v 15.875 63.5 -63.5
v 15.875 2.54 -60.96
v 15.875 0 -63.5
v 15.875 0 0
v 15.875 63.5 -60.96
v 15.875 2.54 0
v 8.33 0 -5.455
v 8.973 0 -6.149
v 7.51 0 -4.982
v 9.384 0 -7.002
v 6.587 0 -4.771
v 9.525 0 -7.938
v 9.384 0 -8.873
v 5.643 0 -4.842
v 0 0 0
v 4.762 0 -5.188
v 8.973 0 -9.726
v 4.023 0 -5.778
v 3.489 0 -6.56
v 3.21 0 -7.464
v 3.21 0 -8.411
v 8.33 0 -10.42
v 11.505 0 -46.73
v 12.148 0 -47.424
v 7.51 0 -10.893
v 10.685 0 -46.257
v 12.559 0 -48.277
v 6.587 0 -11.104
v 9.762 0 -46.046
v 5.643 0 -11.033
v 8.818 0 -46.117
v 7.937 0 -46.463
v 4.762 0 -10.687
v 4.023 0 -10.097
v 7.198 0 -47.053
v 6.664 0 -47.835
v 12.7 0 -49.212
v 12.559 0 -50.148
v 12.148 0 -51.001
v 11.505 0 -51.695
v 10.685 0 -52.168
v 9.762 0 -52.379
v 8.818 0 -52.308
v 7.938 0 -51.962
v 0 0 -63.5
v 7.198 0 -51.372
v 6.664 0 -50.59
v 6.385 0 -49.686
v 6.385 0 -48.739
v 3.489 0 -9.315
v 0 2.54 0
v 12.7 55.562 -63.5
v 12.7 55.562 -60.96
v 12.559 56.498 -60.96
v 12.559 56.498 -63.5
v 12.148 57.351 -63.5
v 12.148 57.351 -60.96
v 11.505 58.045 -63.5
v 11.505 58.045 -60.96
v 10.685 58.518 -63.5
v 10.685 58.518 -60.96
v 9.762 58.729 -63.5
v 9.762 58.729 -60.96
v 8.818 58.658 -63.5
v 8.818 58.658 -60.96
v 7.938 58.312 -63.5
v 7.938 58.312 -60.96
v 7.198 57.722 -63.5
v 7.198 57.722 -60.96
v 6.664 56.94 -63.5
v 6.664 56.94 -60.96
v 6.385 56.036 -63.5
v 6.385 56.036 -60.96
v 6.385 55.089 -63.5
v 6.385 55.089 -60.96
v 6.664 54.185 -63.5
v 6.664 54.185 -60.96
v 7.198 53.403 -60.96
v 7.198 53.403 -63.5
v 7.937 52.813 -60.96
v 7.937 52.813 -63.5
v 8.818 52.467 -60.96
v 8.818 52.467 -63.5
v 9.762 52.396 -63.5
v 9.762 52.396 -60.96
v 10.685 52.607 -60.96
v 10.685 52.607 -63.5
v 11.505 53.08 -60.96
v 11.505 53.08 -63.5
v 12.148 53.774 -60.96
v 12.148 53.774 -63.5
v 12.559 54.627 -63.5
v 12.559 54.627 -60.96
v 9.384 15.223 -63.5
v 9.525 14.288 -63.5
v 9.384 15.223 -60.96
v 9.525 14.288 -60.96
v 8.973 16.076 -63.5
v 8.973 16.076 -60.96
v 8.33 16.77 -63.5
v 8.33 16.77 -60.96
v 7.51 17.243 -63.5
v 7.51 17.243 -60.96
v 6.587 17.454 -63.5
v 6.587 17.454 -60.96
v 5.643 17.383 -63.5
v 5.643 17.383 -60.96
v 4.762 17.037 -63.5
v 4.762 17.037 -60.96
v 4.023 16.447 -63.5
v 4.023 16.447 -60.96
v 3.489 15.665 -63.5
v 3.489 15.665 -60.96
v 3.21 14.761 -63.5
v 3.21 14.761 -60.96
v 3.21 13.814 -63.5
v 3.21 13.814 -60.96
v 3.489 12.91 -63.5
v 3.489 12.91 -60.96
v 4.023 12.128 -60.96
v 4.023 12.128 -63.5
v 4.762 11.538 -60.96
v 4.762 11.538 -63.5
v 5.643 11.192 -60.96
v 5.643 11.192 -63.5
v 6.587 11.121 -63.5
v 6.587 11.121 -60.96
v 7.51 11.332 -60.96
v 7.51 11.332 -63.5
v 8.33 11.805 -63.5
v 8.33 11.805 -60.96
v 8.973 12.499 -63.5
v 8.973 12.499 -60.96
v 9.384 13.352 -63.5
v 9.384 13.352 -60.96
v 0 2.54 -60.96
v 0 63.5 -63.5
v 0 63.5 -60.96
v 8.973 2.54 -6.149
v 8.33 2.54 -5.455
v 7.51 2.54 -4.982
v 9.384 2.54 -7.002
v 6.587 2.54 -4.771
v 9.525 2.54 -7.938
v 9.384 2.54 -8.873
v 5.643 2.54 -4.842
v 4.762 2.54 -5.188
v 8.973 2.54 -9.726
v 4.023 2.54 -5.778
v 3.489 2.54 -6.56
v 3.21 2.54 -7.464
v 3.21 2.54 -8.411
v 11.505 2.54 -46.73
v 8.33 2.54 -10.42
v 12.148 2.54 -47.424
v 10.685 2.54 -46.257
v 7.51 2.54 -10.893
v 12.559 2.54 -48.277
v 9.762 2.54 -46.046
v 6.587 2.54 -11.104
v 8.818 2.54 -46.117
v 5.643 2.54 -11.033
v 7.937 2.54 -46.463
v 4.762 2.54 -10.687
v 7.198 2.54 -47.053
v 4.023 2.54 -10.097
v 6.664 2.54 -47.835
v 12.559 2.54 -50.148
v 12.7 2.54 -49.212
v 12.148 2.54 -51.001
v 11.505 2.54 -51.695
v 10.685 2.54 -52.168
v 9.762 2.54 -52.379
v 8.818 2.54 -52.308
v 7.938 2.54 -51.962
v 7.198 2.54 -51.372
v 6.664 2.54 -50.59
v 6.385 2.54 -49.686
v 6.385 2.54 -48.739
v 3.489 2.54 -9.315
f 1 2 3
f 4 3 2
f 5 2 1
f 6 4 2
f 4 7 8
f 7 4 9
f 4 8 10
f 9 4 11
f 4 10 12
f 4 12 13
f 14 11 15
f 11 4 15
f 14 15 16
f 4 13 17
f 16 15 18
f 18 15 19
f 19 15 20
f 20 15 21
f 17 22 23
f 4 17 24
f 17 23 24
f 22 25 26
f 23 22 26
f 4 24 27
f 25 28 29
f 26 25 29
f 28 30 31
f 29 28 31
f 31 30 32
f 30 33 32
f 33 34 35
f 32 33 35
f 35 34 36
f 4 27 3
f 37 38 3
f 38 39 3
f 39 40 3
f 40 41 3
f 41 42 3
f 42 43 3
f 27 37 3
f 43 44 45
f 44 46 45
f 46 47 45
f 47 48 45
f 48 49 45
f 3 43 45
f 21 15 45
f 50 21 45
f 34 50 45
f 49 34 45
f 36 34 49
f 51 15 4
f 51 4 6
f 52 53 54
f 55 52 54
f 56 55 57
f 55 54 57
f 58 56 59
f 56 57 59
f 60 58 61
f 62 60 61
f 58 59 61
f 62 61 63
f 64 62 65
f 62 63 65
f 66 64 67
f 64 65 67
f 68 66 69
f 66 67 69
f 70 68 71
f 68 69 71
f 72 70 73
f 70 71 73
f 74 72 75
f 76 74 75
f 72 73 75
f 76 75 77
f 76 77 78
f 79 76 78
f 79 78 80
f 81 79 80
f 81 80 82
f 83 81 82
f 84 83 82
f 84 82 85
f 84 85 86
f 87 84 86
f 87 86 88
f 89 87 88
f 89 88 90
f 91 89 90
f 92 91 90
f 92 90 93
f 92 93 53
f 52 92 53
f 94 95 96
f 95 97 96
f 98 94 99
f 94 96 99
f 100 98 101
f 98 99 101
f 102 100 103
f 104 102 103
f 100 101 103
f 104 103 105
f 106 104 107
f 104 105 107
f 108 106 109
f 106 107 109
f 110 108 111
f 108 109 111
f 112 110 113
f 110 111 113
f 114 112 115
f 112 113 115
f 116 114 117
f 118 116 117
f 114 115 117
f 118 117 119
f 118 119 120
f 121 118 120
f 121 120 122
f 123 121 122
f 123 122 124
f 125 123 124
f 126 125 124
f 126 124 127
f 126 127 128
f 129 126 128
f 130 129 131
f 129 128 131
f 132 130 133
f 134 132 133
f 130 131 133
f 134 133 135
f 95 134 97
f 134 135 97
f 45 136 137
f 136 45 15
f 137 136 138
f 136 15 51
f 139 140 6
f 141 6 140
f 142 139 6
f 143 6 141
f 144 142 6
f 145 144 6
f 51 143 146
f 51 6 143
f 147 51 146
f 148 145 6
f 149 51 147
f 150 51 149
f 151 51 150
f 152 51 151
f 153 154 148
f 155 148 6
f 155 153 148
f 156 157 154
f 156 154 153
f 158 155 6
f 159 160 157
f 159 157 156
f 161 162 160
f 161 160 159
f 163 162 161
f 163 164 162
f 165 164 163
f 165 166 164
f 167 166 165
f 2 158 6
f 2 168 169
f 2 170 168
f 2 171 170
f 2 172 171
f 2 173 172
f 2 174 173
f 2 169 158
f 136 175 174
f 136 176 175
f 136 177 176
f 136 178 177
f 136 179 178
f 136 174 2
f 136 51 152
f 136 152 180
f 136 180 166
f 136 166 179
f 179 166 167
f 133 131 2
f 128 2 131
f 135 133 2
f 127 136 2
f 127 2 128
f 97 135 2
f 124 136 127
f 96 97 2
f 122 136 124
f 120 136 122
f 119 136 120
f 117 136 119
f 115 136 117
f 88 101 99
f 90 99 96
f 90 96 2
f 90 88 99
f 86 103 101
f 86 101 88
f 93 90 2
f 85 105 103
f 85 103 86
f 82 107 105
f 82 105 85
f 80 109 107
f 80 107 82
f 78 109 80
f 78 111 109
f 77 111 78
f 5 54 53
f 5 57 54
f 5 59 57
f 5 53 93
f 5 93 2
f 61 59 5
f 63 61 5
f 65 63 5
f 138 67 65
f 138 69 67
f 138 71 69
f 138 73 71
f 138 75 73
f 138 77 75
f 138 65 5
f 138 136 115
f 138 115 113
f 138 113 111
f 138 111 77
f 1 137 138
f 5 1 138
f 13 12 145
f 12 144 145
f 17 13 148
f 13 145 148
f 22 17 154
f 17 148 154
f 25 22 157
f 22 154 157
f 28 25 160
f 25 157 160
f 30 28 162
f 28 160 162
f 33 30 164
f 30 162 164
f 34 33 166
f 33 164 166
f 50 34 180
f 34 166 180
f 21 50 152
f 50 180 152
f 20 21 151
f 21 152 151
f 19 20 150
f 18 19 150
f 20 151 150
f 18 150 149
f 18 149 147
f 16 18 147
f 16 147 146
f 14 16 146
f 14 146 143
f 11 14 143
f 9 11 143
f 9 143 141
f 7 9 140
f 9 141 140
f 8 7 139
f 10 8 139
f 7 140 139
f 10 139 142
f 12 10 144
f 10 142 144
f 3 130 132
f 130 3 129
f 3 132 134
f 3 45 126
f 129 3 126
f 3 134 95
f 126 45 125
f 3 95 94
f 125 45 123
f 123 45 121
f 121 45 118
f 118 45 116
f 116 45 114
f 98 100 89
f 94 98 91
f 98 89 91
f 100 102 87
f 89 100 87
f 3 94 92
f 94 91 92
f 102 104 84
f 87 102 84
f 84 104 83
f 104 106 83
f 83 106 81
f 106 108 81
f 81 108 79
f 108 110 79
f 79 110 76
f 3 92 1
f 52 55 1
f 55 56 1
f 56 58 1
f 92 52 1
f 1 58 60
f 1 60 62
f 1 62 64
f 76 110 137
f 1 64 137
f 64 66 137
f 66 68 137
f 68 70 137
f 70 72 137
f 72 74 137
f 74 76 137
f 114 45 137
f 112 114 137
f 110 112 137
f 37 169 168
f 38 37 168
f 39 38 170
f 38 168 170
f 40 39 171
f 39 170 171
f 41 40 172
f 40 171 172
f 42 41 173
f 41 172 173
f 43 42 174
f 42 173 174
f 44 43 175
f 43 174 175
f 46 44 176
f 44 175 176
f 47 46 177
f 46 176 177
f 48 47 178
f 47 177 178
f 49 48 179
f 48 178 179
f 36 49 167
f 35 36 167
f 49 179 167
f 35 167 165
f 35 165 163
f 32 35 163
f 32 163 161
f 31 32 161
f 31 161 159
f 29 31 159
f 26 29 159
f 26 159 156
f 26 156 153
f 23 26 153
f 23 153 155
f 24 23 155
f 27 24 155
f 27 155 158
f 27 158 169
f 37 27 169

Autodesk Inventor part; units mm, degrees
ref_plane "YZ Plane" through (0, 0, 0) normal (1, 0, 0) x (0, 1, 0)
ref_plane "XZ Plane" through (0, 0, 0) normal (0, 1, 0) x (-1, 0, 0)
ref_plane "XY Plane" through (0, 0, 0) normal (0, 0, 1) x (1, 0, 0)
sketch "Sketch1" plane through (0, 0, 0) normal (1, 0, 0) x (0, 1, 0)
  line L0 (0, 0) -> (0, -63.5)
  line L1 (0, -63.5) -> (63.5, -63.5)
  line L2 (63.5, -63.5) -> (63.5, -60.96)
  line L3 (0, 0) -> (2.54, 0)
  line L4 (2.54, 0) -> (2.54, -60.96)
  line L5 (2.54, -60.96) -> (63.5, -60.96)
  dimension "d0" = 63.5
  dimension "d1" = 63.5
  dimension "d2" = 2.54
  dimension "d3" = 2.54
extrude "Extrusion1" add sketch "Sketch1" along normal blind 15.875
sketch "Sketch2" plane through (0, 2.54, 0) normal (0, 1, 0) x (1, 0, 0)
  circle A0 centre (6.35, 7.9375) radius 3.175
  circle A1 centre (9.525, 49.2125) radius 3.175
  point P0 (0, 0)
  dimension "d6" = 6.35
  dimension "d7" = 6.35
extrude "Extrusion2" cut sketch "Sketch2" against normal through all contours A1
extrude "Extrusion3" cut sketch "Sketch2" against normal through all contours A0
sketch "Sketch3" plane through (0, 2.54, -60.96) normal (0, 0, 1) x (1, 0, 0)
  line L0 (15.875, 60.96) -> (15.875, 53.0225)
  line L1 (15.875, 53.0225) -> (9.525, 53.0225)
  line L2 (15.875, 53.0225) -> (15.875, 11.7475)
  line L3 (15.875, 11.7475) -> (6.35, 11.7475)
  circle A0 centre (6.35, 11.7475) radius 3.175
  circle A1 centre (9.525, 53.0225) radius 3.175
  point P0 (0, -2.54)
  dimension "d12" = 6.35
  dimension "d13" = 6.35
  dimension "d14" = 6.35
  dimension "d15" = 7.9375
  dimension "d16" = 41.275
  dimension "d17" = 9.525
extrude "Extrusion4" cut sketch "Sketch3" against normal through all contours A0
extrude "Extrusion5" cut sketch "Sketch3" against normal through all contours A1
properties part number "Plywood Pickle Mount Corner Bracket"
